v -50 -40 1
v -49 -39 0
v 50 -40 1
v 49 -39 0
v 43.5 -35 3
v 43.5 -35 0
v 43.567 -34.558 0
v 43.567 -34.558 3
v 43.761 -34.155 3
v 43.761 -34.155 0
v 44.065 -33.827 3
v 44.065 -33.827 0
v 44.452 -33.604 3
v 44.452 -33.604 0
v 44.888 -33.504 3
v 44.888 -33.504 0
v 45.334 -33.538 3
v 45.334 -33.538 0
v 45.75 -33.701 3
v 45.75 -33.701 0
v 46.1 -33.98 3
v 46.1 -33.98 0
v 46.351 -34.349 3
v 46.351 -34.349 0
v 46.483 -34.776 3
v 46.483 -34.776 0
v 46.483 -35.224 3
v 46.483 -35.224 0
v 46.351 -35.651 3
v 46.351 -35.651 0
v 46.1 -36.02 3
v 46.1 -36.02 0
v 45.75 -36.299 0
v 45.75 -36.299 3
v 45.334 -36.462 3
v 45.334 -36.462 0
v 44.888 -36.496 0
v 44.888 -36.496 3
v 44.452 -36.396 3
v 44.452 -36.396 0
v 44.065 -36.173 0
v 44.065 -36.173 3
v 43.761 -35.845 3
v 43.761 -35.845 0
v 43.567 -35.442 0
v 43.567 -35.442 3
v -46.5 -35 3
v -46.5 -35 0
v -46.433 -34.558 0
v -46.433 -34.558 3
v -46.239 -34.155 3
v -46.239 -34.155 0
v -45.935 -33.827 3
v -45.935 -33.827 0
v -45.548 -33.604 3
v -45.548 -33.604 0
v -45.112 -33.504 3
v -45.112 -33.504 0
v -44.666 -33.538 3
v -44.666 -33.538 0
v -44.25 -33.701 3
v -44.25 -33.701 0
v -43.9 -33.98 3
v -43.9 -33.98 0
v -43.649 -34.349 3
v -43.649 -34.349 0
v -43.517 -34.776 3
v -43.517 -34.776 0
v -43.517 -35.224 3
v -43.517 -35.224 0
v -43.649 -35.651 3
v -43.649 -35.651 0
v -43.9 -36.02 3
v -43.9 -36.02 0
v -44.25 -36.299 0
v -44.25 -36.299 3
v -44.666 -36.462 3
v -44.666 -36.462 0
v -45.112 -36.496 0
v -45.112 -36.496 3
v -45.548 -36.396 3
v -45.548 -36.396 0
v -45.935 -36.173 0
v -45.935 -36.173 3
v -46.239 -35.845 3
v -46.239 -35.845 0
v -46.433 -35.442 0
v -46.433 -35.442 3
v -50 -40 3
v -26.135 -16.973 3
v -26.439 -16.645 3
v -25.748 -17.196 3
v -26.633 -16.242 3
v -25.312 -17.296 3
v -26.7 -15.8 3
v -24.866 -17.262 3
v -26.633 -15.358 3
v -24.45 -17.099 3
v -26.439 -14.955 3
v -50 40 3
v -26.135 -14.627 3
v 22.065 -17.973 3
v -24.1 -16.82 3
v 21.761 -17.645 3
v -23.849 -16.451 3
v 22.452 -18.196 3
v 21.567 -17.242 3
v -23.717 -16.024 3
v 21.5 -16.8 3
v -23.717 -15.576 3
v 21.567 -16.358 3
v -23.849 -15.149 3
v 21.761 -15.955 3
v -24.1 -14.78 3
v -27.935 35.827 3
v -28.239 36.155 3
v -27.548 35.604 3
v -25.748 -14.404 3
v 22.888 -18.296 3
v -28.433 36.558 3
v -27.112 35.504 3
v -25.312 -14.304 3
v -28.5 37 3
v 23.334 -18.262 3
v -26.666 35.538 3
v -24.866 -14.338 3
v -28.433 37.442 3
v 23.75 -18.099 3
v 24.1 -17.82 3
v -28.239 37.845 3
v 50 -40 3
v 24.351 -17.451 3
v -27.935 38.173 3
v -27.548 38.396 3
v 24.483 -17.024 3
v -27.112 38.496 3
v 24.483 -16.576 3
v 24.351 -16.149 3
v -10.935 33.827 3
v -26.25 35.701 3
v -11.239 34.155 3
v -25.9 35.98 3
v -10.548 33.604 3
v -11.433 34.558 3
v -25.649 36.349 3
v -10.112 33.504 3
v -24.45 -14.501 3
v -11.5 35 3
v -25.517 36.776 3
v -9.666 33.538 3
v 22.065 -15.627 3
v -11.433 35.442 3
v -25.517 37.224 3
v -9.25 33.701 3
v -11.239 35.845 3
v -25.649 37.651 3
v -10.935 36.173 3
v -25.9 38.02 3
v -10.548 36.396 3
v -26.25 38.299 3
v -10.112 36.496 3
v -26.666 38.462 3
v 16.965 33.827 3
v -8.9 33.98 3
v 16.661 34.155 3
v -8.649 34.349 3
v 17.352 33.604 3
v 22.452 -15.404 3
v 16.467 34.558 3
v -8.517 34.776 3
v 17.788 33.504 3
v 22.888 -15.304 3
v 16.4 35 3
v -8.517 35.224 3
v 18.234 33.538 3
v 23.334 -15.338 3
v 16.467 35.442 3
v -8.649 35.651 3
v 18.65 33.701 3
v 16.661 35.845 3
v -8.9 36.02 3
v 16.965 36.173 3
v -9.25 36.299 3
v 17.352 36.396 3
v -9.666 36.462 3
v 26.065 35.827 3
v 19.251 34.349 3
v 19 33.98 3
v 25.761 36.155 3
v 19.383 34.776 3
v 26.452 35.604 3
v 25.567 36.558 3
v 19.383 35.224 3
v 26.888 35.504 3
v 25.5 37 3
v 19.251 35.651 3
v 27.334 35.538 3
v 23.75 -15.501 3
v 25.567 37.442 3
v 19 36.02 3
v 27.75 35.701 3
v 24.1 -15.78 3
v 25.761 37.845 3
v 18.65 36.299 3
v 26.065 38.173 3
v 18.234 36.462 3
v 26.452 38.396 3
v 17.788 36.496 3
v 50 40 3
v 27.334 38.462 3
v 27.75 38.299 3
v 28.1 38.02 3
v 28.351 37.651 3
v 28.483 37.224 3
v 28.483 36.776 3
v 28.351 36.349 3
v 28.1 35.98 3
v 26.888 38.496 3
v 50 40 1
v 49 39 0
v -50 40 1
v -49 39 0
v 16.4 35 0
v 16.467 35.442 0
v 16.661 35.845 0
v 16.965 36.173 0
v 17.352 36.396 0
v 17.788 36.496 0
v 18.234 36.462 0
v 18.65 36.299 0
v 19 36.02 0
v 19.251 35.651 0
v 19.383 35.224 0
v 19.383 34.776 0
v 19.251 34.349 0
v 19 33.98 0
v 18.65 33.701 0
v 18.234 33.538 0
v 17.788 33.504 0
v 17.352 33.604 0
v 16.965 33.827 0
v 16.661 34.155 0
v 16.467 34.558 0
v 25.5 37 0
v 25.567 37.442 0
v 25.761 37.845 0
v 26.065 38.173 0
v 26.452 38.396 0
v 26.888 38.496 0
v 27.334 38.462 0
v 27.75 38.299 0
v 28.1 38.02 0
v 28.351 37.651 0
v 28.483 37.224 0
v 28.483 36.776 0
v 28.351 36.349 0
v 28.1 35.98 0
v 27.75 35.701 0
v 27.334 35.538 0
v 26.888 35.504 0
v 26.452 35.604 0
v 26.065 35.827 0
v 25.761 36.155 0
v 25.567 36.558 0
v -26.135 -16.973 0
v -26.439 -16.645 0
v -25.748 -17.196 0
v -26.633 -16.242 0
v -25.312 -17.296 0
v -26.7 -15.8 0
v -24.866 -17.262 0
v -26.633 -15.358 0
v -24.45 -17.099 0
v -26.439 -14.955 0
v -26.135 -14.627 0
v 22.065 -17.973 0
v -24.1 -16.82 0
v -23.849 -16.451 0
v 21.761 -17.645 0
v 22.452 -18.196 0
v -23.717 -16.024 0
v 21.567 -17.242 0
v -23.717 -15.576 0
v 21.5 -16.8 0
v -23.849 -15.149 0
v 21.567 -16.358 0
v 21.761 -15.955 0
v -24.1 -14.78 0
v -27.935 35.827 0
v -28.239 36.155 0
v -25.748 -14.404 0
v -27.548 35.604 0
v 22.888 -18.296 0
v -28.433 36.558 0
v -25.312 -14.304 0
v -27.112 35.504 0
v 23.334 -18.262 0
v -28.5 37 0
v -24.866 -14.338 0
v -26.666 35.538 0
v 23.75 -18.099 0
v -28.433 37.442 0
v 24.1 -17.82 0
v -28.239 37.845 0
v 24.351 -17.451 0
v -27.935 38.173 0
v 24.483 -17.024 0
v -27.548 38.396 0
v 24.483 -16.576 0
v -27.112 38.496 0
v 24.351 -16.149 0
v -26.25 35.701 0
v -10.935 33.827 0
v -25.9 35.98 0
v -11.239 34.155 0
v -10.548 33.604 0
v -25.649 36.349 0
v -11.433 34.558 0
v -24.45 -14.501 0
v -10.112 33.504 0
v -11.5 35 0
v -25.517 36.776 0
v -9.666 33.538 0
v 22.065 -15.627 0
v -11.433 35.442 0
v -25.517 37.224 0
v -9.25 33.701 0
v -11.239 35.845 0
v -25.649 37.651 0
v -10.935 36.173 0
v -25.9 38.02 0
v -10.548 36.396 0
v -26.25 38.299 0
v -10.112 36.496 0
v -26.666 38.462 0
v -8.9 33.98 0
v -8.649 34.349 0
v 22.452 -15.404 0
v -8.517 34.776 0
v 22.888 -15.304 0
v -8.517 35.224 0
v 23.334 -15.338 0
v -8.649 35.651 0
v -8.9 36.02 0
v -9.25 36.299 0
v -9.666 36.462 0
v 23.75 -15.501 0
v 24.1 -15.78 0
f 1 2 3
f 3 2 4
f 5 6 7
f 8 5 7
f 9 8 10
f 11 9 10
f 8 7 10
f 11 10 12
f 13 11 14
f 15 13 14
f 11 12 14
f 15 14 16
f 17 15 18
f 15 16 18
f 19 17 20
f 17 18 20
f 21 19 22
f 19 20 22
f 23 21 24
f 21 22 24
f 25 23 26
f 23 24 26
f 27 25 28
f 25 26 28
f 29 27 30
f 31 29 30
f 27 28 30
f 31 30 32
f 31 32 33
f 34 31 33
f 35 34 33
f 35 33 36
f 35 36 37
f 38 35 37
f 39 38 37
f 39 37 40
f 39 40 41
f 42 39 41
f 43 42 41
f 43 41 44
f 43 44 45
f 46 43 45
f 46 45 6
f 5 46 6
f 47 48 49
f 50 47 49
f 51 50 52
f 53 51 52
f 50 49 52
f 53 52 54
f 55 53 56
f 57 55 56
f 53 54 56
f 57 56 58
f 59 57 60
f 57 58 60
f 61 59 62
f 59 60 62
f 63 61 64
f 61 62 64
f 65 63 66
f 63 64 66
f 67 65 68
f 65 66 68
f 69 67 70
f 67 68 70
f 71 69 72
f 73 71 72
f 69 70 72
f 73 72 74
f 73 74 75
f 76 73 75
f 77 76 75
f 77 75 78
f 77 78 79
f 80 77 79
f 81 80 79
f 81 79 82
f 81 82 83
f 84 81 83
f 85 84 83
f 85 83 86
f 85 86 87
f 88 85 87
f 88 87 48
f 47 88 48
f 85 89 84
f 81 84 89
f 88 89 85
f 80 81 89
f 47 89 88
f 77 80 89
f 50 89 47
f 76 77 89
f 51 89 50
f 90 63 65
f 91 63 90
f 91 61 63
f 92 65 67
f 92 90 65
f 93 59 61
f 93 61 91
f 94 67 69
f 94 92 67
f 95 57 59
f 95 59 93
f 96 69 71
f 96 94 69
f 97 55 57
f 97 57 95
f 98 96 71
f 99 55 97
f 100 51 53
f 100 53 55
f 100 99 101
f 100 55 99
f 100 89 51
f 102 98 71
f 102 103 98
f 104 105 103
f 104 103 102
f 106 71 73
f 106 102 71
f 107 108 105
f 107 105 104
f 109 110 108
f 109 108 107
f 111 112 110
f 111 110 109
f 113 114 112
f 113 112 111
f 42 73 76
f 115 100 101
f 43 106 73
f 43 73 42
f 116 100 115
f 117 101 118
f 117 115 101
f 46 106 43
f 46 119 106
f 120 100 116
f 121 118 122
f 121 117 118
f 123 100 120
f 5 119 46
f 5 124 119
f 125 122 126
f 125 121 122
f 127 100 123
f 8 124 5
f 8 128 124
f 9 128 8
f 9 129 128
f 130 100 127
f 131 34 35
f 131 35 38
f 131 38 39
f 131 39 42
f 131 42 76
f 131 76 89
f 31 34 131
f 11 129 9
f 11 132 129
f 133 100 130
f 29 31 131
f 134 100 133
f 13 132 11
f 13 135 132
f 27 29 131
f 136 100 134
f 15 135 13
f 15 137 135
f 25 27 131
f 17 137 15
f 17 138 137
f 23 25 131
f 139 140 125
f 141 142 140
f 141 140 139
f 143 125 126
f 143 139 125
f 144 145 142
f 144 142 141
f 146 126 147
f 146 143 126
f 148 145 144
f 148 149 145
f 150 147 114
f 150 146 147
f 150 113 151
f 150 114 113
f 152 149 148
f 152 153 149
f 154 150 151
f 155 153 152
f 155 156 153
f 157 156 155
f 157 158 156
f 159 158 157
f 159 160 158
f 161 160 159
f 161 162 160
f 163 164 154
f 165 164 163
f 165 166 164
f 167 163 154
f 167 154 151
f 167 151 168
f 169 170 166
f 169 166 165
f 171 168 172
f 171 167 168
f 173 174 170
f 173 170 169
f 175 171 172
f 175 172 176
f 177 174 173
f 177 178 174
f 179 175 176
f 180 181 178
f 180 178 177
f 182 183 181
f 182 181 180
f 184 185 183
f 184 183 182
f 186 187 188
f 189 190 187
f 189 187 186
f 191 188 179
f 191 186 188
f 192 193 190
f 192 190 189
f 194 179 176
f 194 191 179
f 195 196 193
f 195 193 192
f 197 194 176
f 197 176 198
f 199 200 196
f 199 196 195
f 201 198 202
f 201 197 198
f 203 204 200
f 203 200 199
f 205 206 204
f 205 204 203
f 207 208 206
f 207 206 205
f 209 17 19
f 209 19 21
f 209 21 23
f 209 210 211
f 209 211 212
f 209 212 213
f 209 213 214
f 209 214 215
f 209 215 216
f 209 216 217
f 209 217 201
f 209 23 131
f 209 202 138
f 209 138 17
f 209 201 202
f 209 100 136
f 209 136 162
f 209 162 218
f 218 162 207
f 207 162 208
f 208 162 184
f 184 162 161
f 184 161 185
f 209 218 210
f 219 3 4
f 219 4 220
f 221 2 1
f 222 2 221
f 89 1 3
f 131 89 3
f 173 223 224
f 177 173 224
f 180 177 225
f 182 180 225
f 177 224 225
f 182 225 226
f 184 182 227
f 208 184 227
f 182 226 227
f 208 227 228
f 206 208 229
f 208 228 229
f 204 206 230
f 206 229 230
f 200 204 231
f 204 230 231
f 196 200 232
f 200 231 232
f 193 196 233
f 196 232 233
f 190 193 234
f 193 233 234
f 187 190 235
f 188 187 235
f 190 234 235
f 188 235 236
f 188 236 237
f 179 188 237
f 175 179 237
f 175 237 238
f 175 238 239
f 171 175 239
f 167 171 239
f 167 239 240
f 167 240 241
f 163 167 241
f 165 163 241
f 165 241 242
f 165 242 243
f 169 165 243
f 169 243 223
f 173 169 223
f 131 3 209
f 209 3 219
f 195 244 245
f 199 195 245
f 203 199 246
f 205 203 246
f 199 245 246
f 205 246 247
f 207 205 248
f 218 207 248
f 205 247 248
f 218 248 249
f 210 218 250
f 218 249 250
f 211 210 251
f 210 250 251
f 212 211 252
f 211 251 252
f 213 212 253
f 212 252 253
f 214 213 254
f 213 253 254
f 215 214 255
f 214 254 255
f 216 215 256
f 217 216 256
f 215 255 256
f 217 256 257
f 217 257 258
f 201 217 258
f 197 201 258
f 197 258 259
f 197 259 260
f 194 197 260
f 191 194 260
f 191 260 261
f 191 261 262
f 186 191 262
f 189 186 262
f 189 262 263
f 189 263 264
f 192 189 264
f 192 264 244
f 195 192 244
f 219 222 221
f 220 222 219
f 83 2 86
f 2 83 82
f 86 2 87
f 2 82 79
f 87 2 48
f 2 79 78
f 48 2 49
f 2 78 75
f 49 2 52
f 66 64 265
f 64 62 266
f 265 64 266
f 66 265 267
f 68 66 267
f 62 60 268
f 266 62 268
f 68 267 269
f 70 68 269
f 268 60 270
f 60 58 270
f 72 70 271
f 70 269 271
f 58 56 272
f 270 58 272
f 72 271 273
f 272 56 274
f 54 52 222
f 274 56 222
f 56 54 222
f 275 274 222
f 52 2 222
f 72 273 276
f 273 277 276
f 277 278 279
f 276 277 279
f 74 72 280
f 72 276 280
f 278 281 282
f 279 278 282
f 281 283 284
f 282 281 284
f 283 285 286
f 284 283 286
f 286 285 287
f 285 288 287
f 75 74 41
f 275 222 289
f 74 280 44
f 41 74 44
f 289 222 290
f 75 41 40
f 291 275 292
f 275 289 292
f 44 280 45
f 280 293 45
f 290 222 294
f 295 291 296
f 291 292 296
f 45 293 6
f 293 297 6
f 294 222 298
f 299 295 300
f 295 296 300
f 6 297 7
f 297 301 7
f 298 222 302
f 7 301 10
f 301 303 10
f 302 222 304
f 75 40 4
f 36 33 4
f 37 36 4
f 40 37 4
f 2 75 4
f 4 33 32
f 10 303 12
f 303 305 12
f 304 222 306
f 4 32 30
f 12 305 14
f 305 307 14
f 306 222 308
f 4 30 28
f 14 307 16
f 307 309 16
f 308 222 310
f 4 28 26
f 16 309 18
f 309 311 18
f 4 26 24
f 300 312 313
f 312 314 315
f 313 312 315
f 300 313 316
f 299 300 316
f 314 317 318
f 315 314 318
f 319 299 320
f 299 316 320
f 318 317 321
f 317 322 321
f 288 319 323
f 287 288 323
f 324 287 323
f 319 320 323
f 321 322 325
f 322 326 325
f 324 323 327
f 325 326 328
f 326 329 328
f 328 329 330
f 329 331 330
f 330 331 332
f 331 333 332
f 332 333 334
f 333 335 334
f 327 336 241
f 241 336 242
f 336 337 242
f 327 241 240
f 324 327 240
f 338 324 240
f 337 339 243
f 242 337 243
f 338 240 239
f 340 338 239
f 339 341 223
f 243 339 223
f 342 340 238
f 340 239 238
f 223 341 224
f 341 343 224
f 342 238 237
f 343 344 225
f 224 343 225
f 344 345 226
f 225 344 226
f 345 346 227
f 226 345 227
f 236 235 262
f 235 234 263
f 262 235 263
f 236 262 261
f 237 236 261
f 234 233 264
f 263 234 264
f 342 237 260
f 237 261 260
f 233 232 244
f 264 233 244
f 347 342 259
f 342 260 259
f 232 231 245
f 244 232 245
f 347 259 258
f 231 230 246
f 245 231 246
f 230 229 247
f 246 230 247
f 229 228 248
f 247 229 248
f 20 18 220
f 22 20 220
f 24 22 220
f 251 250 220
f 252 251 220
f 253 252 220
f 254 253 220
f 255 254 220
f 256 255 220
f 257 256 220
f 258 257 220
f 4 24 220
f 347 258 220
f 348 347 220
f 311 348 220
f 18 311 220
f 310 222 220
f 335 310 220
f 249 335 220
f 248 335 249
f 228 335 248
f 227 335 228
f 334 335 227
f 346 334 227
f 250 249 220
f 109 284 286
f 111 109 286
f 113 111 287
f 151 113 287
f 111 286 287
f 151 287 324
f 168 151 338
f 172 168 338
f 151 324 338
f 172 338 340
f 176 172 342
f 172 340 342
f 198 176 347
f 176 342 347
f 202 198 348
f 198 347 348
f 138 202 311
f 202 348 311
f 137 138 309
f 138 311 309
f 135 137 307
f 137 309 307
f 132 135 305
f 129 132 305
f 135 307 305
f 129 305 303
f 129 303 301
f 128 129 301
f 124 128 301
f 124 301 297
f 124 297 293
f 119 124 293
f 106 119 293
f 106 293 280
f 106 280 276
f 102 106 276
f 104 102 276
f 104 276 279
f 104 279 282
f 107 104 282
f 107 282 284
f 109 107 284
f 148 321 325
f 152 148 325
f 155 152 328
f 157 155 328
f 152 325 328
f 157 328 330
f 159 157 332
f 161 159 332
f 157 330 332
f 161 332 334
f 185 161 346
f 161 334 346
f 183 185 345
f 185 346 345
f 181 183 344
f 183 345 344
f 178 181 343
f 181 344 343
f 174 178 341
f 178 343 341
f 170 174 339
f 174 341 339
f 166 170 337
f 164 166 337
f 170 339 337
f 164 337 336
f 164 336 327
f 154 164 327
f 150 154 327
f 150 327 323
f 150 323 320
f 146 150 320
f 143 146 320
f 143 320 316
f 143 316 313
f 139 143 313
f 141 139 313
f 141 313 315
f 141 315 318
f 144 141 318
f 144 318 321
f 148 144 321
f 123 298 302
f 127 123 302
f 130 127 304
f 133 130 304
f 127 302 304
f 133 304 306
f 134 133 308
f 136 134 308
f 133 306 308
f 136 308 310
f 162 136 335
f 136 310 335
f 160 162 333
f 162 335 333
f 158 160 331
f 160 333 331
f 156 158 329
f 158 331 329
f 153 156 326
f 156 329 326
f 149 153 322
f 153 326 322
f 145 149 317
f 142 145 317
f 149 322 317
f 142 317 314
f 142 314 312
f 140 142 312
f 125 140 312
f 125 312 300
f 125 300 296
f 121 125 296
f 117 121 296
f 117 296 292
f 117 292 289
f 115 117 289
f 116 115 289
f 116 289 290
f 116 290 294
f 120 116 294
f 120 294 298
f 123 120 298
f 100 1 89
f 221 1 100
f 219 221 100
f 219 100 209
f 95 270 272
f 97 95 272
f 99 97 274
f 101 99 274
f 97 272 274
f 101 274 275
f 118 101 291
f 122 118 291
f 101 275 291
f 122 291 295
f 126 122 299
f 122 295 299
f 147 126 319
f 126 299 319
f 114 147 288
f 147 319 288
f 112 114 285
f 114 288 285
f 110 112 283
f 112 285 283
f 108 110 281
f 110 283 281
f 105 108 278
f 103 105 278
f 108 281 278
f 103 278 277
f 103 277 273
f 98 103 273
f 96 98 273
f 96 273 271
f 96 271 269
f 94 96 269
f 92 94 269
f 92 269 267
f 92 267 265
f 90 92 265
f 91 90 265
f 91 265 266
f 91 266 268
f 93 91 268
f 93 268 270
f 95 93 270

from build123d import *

# Parameters (mm, degrees)
F0_W     = 100
F0_H     = 80
F1_DEPTH = 3
F3_D     = 3
F4_SIZE  = 1
F6_D     = 3


with BuildPart() as f1:
    # F0 (on Top) → F1 (new body)
    with BuildSketch(Plane.XY):
        Rectangle(F0_W, F0_H)
    extrude(amount=F1_DEPTH)

    # F3 (through all)
    with Locations(Plane.XY.offset(3)):
        with Locations((-10, 35), (17.9, 35), (23, -16.8), (-25.2, -15.8)):
            Hole(F3_D / 2)

    # F4
    f4_edges = [f1.edges().sort_by_distance(p)[0] for p in [
        (0, -40, 0),
        (-50, 0, 0),
        (50, 0, 0),
        (0, 40, 0),
    ]]
    chamfer(f4_edges, length=F4_SIZE)

    # F6 (through all)
    with Locations(Plane.XY.offset(3)):
        with Locations((-45, -35), (-27, 37), (27, 37), (45, -35)):
            Hole(F6_D / 2)


solid = f1.part
